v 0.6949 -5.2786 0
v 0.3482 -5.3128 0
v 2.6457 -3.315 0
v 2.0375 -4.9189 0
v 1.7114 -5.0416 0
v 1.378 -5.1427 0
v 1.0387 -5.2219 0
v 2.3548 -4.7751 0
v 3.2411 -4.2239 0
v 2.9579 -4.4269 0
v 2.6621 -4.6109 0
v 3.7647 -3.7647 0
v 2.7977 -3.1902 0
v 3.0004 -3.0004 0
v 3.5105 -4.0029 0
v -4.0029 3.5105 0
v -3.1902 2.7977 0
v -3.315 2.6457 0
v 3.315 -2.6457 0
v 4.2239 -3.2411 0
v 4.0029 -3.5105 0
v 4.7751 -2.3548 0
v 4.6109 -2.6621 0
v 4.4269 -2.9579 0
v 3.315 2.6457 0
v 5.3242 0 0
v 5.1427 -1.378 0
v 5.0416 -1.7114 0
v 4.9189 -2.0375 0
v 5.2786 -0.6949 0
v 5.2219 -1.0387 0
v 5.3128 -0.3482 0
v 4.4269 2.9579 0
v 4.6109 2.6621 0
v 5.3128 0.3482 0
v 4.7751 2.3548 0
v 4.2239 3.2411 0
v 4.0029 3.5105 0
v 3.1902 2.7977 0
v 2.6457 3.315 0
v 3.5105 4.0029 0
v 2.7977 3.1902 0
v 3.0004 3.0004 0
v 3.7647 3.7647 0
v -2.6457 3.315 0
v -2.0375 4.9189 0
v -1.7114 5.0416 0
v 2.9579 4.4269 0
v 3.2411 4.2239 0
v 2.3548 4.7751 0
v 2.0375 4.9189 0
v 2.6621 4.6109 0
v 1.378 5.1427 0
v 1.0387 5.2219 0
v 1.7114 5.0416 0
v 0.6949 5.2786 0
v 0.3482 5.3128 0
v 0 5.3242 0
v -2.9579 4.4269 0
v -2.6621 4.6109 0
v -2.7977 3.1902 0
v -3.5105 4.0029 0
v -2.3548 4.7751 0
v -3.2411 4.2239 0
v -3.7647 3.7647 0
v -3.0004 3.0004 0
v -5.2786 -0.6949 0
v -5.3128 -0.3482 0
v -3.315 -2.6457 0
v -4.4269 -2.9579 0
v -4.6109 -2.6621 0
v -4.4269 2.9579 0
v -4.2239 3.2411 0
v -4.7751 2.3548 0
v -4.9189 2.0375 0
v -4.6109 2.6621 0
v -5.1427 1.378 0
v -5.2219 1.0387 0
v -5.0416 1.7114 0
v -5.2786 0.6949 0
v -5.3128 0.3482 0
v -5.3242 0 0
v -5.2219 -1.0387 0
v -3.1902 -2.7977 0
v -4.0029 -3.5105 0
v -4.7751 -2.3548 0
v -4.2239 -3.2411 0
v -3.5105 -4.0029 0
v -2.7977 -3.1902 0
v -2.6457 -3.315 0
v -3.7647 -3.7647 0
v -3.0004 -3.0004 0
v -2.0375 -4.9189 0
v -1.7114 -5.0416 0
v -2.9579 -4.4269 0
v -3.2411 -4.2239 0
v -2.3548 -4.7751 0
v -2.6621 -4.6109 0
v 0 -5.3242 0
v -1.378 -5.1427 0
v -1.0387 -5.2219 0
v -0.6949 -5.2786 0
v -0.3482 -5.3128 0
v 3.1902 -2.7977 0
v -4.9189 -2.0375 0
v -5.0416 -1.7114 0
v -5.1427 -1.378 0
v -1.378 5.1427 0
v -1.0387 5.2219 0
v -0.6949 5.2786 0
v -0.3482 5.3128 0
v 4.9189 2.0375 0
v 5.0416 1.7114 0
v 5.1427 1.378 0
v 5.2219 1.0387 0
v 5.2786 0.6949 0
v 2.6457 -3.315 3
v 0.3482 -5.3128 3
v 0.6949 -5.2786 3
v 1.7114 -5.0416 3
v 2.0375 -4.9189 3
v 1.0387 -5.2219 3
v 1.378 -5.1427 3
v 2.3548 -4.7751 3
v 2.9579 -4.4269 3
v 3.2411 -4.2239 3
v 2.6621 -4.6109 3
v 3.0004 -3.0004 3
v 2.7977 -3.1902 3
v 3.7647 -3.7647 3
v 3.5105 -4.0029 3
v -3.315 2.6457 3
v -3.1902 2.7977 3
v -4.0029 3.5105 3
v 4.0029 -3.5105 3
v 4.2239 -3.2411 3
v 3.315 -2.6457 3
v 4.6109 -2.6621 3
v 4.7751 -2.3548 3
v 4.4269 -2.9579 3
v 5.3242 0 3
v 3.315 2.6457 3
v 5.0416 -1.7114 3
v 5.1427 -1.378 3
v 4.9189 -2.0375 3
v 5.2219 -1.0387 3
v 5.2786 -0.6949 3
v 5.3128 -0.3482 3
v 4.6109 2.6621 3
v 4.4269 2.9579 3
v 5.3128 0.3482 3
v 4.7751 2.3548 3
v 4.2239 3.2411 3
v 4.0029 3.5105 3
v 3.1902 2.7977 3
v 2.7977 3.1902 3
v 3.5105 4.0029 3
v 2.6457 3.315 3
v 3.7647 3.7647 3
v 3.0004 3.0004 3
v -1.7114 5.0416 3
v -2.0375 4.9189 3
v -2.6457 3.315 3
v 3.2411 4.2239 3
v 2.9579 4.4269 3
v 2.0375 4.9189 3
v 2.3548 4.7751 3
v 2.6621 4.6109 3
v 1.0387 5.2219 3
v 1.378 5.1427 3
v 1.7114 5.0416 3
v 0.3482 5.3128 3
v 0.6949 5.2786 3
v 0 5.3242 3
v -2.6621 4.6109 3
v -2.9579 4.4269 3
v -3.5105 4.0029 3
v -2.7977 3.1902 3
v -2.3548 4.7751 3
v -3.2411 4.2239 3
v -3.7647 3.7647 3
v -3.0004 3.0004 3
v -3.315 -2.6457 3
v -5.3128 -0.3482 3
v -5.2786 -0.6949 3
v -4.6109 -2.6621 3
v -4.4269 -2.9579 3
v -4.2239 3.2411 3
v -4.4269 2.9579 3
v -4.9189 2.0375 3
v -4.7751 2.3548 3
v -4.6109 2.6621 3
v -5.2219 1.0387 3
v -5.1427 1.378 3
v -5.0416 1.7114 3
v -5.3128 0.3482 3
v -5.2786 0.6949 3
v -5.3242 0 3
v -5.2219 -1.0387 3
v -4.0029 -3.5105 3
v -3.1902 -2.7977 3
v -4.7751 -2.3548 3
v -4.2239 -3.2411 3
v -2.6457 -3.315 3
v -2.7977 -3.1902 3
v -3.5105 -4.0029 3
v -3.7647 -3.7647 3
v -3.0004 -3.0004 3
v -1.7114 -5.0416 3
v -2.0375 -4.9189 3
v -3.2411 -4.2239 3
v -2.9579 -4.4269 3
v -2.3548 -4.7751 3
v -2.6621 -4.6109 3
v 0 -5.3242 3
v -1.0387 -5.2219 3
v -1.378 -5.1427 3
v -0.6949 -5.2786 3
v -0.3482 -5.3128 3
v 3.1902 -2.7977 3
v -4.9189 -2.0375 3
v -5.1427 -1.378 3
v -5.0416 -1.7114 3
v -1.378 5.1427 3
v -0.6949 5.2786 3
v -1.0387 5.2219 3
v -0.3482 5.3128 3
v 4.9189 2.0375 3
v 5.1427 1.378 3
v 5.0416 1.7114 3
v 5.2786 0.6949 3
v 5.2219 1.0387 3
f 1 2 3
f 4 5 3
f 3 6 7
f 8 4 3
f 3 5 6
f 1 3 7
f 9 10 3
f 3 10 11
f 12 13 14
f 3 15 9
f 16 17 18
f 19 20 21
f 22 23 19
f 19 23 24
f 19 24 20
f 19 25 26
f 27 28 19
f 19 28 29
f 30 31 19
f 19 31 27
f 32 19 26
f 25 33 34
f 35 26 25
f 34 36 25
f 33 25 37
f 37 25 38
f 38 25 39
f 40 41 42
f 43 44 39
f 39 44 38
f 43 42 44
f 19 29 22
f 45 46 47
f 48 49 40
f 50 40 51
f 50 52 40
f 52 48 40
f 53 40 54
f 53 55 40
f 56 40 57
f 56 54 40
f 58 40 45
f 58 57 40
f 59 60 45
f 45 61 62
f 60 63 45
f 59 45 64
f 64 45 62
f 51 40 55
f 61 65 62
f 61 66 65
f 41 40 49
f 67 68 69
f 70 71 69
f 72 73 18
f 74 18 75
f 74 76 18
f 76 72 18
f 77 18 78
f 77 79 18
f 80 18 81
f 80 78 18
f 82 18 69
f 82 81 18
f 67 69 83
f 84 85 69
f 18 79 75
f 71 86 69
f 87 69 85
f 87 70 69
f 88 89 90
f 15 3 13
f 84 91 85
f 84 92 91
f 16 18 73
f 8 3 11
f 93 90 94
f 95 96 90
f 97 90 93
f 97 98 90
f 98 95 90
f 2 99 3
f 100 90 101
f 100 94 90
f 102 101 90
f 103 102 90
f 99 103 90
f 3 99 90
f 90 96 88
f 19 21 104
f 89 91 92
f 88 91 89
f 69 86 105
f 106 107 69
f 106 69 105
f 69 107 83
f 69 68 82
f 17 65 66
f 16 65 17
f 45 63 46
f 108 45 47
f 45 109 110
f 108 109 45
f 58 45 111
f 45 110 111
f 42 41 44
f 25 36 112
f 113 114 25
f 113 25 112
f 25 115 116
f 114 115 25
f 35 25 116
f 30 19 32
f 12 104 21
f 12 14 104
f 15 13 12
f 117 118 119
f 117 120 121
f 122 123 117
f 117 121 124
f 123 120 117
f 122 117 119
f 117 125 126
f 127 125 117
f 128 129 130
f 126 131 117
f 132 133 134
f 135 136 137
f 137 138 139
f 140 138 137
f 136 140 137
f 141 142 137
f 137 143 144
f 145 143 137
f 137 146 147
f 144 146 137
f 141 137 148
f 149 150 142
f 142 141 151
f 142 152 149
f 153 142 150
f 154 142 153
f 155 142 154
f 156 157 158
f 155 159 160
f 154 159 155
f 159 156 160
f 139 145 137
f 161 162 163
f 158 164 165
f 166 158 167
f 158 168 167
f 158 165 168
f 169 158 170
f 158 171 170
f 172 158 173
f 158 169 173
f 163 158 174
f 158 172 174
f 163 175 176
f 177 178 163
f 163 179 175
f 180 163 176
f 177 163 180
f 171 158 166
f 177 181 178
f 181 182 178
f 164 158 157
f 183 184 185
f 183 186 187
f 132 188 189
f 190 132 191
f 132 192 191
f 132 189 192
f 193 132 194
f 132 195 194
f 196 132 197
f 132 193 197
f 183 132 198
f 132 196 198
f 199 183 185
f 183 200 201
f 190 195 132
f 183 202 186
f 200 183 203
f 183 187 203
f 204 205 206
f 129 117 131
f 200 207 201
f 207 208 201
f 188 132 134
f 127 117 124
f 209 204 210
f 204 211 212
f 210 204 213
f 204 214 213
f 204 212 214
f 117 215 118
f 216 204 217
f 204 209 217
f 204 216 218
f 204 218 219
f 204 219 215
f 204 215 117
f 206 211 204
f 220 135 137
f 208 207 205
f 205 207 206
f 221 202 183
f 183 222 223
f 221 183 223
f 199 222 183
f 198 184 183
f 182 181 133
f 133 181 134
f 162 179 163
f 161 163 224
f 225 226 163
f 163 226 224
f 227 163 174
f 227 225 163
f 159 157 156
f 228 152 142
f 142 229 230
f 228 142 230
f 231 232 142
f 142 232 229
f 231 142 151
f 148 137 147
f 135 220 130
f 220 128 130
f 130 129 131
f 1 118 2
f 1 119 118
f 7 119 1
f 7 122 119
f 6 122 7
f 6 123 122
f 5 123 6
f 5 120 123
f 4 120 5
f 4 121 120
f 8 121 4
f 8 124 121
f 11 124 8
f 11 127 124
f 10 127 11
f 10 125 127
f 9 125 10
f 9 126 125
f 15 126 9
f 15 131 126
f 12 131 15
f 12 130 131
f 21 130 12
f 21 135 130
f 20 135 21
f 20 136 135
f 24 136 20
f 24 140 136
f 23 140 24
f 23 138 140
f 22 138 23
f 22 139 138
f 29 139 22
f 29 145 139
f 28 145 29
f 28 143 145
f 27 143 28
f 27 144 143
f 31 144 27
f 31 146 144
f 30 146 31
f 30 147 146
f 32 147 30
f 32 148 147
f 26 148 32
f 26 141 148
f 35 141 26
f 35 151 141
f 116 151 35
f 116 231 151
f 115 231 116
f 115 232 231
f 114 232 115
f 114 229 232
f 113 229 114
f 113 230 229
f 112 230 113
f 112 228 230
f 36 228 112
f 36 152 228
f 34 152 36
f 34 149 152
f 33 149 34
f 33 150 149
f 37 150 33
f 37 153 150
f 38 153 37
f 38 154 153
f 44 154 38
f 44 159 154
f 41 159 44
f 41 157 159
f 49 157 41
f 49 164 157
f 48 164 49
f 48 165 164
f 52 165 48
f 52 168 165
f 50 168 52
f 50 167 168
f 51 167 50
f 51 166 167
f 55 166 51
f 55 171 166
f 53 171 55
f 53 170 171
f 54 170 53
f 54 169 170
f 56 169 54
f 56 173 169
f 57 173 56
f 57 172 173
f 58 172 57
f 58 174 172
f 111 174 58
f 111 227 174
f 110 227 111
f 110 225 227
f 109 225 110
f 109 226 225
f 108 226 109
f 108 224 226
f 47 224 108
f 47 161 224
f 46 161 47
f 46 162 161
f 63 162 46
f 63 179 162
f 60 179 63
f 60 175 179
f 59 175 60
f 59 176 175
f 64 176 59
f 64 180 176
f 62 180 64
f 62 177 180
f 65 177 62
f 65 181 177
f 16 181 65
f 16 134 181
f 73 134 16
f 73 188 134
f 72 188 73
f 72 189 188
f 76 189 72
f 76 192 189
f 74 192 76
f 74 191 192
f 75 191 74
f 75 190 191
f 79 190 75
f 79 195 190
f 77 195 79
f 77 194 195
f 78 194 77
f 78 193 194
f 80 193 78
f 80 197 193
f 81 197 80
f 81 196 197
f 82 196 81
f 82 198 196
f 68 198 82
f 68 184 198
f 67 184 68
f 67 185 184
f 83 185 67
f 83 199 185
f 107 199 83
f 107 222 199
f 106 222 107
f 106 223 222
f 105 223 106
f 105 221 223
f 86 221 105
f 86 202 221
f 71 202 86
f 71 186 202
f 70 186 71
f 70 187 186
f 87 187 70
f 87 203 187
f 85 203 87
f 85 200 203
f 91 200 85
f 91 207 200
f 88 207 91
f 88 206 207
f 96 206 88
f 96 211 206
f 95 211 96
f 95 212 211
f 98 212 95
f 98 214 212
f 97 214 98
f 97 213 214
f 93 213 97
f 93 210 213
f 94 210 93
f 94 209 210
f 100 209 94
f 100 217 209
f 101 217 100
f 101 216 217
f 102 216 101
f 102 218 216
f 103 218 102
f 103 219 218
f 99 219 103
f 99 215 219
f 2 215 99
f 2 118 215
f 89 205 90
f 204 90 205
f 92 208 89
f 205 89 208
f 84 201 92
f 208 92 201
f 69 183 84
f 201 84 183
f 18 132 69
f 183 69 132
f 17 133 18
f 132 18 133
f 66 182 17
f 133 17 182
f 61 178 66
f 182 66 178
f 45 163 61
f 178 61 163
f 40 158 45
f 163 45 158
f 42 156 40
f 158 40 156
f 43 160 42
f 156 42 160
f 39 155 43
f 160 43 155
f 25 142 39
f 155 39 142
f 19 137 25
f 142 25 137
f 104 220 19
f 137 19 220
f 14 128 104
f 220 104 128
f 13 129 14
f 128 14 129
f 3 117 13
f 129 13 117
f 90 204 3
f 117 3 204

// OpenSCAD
$fn = 96;

/* Library for Involute Gears, Screws and Racks

This library contains the following modules
- rack(modul, length, height, width, pressure_angle=20, helix_angle=0)
- spur_gear(modul, tooth_number, width, bore, pressure_angle=20, helix_angle=0, optimized=true)
- herringbone_gear(modul, tooth_number, width, bore, pressure_angle=20, helix_angle=0, optimized=true)
- rack_and_pinion (modul, rack_length, gear_teeth, rack_height, gear_bore, width, pressure_angle=20, helix_angle=0, together_built=true, optimized=true)
- ring_gear(modul, tooth_number, width, rim_width, pressure_angle=20, helix_angle=0)
- herringbone_ring_gear(modul, tooth_number, width, rim_width, pressure_angle=20, helix_angle=0)
- planetary_gear(modul, sun_teeth, planet_teeth, number_planets, width, rim_width, bore, pressure_angle=20, helix_angle=0, together_built=true, optimized=true)
- bevel_gear(modul, tooth_number,  partial_cone_angle, tooth_width, bore, pressure_angle=20, helix_angle=0)
- bevel_herringbone_gear(modul, tooth_number, partial_cone_angle, tooth_width, bore, pressure_angle=20, helix_angle=0)
- bevel_gear_pair(modul, gear_teeth, pinion_teeth, axis_angle=90, tooth_width, bore, pressure_angle = 20, helix_angle=0, together_built=true)
- bevel_herringbone_gear_pair(modul, gear_teeth, pinion_teeth, axis_angle=90, tooth_width, bore, pressure_angle = 20, helix_angle=0, together_built=true)
- worm(modul, thread_starts, length, bore, pressure_angle=20, lead_angle=10, together_built=true)
- worm_gear(modul, tooth_number, thread_starts, width, length, worm_bore, gear_bore, pressure_angle=20, lead_angle=0, optimized=true, together_built=true)

Examples of each module are commented out at the end of this file

Author:      Dr Jörg Janssen
Last Verified On:      1. June 2018
Version:    2.2
License:     Creative Commons - Attribution, Non Commercial, Share Alike

Permitted modules according to DIN 780:
0.05 0.06 0.08 0.10 0.12 0.16
0.20 0.25 0.3  0.4  0.5  0.6
0.7  0.8  0.9  1    1.25 1.5
2    2.5  3    4    5    6
8    10   12   16   20   25
32   40   50   60

*/


// General Variables
pi = 3.14159;
rad = 57.29578;
clearance = 0.05;   // clearance between teeth

/*  Converts Radians to Degrees */
function grad(pressure_angle) = pressure_angle*rad;

/*  Converts Degrees to Radians */
function radian(pressure_angle) = pressure_angle/rad;

/*  Converts 2D Polar Coordinates to Cartesian
    Format: radius, phi; phi = Angle to x-Axis on xy-Plane */
function polar_to_cartesian(polvect) = [
    polvect[0]*cos(polvect[1]),  
    polvect[0]*sin(polvect[1])
];

/*  Circle Involutes-Function:
    Returns the Polar Coordinates of an Involute Circle
    r = Radius of the Base Circle
    rho = Rolling-angle in Degrees */
function ev(r,rho) = [
    r/cos(rho),
    grad(tan(rho)-radian(rho))
];

/*  Sphere-Involutes-Function
    Returns the Azimuth Angle of an Involute Sphere
    theta0 = Polar Angle of the Cone, where the Cutting Edge of the Large Sphere unrolls the Involute
    theta = Polar Angle for which the Azimuth Angle of the Involute is to be calculated */
function sphere_ev(theta0,theta) = 1/sin(theta0)*acos(cos(theta)/cos(theta0))-acos(tan(theta0)/tan(theta));

/*  Converts Spherical Coordinates to Cartesian
    Format: radius, theta, phi; theta = Angle to z-Axis, phi = Angle to x-Axis on xy-Plane */
function sphere_to_cartesian(vect) = [
    vect[0]*sin(vect[1])*cos(vect[2]),  
    vect[0]*sin(vect[1])*sin(vect[2]),
    vect[0]*cos(vect[1])
];

/*  Check if a Number is even
    = 1, if so
    = 0, if the Number is not even */
function is_even(number) =
    (number == floor(number/2)*2) ? 1 : 0;

/*  greatest common Divisor
    according to Euclidean Algorithm.
    Sorting: a must be greater than b */
function ggt(a,b) = 
    a%b == 0 ? b : ggt(b,a%b);

/*  Polar function with polar angle and two variables */
function spiral(a, r0, phi) =
    a*phi + r0; 

/*  Spur gear
    modul = Height of the Tooth Tip beyond the Pitch Circle
    tooth_number = Number of Gear Teeth
    width = tooth_width
    bore = Diameter of the Center Hole
    circle_rad = raised bore outer circle radius
    pressure_angle = Pressure Angle, Standard = 20° according to DIN 867. Should not exceed 45°.
    helix_angle = Helix Angle to the Axis of Rotation; 0° = Spur Teeth
    optimized = Create holes for Material-/Weight-Saving or Surface Enhancements where Geometry allows */
module spur_gear(modul, tooth_number, width, circle_rad, bore, pressure_angle = 20, helix_angle = 0, optimized = true) {

    // Dimension Calculations  
    d = modul * tooth_number;                                           // Pitch Circle Diameter
    r = d / 2;                                                      // Pitch Circle Radius
    alpha_spur = atan(tan(pressure_angle)/cos(helix_angle));// Helix Angle in Transverse Section
    db = d * cos(alpha_spur);                                      // Base Circle Diameter
    rb = db / 2;                                                    // Base Circle Radius
    da = (modul <1)? d + modul * 2.2 : d + modul * 2;               // Tip Diameter according to DIN 58400 or DIN 867
    ra = da / 2;                                                    // Tip Circle Radius
    c =  (tooth_number <3)? 0 : modul/6;                                // Tip Clearance
    df = d - 2 * (modul + c);                                       // Root Circle Diameter
    rf = df / 2;                                                    // Root Radius
    rho_ra = acos(rb/ra);                                           // Maximum Rolling Angle;
                                                                    // Involute begins on the Base Circle and ends at the Tip Circle
    rho_r = acos(rb/r);                                             // Rolling Angle at Pitch Circle;
                                                                    // Involute begins on the Base Circle and ends at the Tip Circle
    phi_r = grad(tan(rho_r)-radian(rho_r));                         // Angle to Point of Involute on Pitch Circle
    gamma = rad*width/(r*tan(90-helix_angle));               // Torsion Angle for Extrusion
    step = rho_ra/16;                                            // Involute is divided into 16 pieces
    tau = 360/tooth_number;                                             // Pitch Angle
    
    r_hole = (2*rf - bore)/8;                                    // Radius of Holes for Material-/Weight-Saving
    rm = bore/2+2*r_hole;                                        // Distance of the Axes of the Holes from the Main Axis
    z_hole = floor(2*pi*rm/(3*r_hole));                             // Number of Holes for Material-/Weight-Saving
    
    optimized = (optimized && r >= width*1.5 && d > 2*bore);    // is Optimization useful?

    // Drawing
    union(){
        /*rotate([0,0,-phi_r-90*(1-clearance)/tooth_number]){                     // Center Tooth on X-Axis;
                                                                        // Makes Alignment with other Gears easier

            linear_extrude(height = width, twist = gamma){
                difference(){
                    union(){
                        tooth_width = (180*(1-clearance))/tooth_number+2*phi_r;
                        circle(rf);                                     // Root Circle 
                        for (rot = [0:tau:360]){
                            rotate (rot){                               // Copy and Rotate "Number of Teeth"
                                polygon(concat(                         // Tooth
                                    [[0,0]],                            // Tooth Segment starts and ends at Origin
                                    [for (rho = [0:step:rho_ra])     // From zero Degrees (Base Circle)
                                                                        // To Maximum Involute Angle (Tip Circle)
                                        polar_to_cartesian(ev(rb,rho))],       // First Involute Flank

                                    [polar_to_cartesian(ev(rb,rho_ra))],       // Point of Involute on Tip Circle

                                    [for (rho = [rho_ra:-step:0])    // of Maximum Involute Angle (Tip Circle)
                                                                        // to zero Degrees (Base Circle)
                                        polar_to_cartesian([ev(rb,rho)[0], tooth_width-ev(rb,rho)[1]])]
                                                                        // Second Involute Flank
                                                                        // (180*(1-clearance)) instead of 180 Degrees,
                                                                        // to allow clearance of the Flanks
                                    )
                                );
                            }
                        }
                    }           
                    circle(r = rm+r_hole*1.49);                         // "bore"
                }
            }
        }*/
        // with Material Savings
        if (optimized) {
            linear_extrude(height = width){
                difference(){
                        echo("circle rad: ",circle_rad);
                        echo("bore lenwidth: ",bore);
                        circle(r = circle_rad);
                        intersection() {
                            square([bore,bore], center=true);
                            circle(r = bore/1.10*0.69);
                        }
                    }
                }
            linear_extrude(height = (width-r_hole/2 < width*2/3) ? width*2/3 : width-r_hole/2){
                difference(){
                    circle(r=rm+r_hole*1.51);
                    union(){
                        circle(r=circle_rad);
                        for (i = [0:1:z_hole]){
                            translate(sphere_to_cartesian([rm,90,i*360/z_hole]))
                                circle(r = r_hole);
                        }
                    }
                }
            }
        }
        // without Material Savings
        else {
            linear_extrude(height = width){
                difference(){
                    //circle(r = rm+r_hole*1.51);
                    circle(r = rm);
                    difference() {
                        intersection() {
                            square([bore,bore], center=true);
                            circle(r = bore*0.64);
                        }
                    }
                }
            }
        }
    }
}

spur_gear (modul=1, tooth_number=17, width=3, circle_rad=5, bore=6.63, pressure_angle=20, helix_angle=0, optimized=false);
